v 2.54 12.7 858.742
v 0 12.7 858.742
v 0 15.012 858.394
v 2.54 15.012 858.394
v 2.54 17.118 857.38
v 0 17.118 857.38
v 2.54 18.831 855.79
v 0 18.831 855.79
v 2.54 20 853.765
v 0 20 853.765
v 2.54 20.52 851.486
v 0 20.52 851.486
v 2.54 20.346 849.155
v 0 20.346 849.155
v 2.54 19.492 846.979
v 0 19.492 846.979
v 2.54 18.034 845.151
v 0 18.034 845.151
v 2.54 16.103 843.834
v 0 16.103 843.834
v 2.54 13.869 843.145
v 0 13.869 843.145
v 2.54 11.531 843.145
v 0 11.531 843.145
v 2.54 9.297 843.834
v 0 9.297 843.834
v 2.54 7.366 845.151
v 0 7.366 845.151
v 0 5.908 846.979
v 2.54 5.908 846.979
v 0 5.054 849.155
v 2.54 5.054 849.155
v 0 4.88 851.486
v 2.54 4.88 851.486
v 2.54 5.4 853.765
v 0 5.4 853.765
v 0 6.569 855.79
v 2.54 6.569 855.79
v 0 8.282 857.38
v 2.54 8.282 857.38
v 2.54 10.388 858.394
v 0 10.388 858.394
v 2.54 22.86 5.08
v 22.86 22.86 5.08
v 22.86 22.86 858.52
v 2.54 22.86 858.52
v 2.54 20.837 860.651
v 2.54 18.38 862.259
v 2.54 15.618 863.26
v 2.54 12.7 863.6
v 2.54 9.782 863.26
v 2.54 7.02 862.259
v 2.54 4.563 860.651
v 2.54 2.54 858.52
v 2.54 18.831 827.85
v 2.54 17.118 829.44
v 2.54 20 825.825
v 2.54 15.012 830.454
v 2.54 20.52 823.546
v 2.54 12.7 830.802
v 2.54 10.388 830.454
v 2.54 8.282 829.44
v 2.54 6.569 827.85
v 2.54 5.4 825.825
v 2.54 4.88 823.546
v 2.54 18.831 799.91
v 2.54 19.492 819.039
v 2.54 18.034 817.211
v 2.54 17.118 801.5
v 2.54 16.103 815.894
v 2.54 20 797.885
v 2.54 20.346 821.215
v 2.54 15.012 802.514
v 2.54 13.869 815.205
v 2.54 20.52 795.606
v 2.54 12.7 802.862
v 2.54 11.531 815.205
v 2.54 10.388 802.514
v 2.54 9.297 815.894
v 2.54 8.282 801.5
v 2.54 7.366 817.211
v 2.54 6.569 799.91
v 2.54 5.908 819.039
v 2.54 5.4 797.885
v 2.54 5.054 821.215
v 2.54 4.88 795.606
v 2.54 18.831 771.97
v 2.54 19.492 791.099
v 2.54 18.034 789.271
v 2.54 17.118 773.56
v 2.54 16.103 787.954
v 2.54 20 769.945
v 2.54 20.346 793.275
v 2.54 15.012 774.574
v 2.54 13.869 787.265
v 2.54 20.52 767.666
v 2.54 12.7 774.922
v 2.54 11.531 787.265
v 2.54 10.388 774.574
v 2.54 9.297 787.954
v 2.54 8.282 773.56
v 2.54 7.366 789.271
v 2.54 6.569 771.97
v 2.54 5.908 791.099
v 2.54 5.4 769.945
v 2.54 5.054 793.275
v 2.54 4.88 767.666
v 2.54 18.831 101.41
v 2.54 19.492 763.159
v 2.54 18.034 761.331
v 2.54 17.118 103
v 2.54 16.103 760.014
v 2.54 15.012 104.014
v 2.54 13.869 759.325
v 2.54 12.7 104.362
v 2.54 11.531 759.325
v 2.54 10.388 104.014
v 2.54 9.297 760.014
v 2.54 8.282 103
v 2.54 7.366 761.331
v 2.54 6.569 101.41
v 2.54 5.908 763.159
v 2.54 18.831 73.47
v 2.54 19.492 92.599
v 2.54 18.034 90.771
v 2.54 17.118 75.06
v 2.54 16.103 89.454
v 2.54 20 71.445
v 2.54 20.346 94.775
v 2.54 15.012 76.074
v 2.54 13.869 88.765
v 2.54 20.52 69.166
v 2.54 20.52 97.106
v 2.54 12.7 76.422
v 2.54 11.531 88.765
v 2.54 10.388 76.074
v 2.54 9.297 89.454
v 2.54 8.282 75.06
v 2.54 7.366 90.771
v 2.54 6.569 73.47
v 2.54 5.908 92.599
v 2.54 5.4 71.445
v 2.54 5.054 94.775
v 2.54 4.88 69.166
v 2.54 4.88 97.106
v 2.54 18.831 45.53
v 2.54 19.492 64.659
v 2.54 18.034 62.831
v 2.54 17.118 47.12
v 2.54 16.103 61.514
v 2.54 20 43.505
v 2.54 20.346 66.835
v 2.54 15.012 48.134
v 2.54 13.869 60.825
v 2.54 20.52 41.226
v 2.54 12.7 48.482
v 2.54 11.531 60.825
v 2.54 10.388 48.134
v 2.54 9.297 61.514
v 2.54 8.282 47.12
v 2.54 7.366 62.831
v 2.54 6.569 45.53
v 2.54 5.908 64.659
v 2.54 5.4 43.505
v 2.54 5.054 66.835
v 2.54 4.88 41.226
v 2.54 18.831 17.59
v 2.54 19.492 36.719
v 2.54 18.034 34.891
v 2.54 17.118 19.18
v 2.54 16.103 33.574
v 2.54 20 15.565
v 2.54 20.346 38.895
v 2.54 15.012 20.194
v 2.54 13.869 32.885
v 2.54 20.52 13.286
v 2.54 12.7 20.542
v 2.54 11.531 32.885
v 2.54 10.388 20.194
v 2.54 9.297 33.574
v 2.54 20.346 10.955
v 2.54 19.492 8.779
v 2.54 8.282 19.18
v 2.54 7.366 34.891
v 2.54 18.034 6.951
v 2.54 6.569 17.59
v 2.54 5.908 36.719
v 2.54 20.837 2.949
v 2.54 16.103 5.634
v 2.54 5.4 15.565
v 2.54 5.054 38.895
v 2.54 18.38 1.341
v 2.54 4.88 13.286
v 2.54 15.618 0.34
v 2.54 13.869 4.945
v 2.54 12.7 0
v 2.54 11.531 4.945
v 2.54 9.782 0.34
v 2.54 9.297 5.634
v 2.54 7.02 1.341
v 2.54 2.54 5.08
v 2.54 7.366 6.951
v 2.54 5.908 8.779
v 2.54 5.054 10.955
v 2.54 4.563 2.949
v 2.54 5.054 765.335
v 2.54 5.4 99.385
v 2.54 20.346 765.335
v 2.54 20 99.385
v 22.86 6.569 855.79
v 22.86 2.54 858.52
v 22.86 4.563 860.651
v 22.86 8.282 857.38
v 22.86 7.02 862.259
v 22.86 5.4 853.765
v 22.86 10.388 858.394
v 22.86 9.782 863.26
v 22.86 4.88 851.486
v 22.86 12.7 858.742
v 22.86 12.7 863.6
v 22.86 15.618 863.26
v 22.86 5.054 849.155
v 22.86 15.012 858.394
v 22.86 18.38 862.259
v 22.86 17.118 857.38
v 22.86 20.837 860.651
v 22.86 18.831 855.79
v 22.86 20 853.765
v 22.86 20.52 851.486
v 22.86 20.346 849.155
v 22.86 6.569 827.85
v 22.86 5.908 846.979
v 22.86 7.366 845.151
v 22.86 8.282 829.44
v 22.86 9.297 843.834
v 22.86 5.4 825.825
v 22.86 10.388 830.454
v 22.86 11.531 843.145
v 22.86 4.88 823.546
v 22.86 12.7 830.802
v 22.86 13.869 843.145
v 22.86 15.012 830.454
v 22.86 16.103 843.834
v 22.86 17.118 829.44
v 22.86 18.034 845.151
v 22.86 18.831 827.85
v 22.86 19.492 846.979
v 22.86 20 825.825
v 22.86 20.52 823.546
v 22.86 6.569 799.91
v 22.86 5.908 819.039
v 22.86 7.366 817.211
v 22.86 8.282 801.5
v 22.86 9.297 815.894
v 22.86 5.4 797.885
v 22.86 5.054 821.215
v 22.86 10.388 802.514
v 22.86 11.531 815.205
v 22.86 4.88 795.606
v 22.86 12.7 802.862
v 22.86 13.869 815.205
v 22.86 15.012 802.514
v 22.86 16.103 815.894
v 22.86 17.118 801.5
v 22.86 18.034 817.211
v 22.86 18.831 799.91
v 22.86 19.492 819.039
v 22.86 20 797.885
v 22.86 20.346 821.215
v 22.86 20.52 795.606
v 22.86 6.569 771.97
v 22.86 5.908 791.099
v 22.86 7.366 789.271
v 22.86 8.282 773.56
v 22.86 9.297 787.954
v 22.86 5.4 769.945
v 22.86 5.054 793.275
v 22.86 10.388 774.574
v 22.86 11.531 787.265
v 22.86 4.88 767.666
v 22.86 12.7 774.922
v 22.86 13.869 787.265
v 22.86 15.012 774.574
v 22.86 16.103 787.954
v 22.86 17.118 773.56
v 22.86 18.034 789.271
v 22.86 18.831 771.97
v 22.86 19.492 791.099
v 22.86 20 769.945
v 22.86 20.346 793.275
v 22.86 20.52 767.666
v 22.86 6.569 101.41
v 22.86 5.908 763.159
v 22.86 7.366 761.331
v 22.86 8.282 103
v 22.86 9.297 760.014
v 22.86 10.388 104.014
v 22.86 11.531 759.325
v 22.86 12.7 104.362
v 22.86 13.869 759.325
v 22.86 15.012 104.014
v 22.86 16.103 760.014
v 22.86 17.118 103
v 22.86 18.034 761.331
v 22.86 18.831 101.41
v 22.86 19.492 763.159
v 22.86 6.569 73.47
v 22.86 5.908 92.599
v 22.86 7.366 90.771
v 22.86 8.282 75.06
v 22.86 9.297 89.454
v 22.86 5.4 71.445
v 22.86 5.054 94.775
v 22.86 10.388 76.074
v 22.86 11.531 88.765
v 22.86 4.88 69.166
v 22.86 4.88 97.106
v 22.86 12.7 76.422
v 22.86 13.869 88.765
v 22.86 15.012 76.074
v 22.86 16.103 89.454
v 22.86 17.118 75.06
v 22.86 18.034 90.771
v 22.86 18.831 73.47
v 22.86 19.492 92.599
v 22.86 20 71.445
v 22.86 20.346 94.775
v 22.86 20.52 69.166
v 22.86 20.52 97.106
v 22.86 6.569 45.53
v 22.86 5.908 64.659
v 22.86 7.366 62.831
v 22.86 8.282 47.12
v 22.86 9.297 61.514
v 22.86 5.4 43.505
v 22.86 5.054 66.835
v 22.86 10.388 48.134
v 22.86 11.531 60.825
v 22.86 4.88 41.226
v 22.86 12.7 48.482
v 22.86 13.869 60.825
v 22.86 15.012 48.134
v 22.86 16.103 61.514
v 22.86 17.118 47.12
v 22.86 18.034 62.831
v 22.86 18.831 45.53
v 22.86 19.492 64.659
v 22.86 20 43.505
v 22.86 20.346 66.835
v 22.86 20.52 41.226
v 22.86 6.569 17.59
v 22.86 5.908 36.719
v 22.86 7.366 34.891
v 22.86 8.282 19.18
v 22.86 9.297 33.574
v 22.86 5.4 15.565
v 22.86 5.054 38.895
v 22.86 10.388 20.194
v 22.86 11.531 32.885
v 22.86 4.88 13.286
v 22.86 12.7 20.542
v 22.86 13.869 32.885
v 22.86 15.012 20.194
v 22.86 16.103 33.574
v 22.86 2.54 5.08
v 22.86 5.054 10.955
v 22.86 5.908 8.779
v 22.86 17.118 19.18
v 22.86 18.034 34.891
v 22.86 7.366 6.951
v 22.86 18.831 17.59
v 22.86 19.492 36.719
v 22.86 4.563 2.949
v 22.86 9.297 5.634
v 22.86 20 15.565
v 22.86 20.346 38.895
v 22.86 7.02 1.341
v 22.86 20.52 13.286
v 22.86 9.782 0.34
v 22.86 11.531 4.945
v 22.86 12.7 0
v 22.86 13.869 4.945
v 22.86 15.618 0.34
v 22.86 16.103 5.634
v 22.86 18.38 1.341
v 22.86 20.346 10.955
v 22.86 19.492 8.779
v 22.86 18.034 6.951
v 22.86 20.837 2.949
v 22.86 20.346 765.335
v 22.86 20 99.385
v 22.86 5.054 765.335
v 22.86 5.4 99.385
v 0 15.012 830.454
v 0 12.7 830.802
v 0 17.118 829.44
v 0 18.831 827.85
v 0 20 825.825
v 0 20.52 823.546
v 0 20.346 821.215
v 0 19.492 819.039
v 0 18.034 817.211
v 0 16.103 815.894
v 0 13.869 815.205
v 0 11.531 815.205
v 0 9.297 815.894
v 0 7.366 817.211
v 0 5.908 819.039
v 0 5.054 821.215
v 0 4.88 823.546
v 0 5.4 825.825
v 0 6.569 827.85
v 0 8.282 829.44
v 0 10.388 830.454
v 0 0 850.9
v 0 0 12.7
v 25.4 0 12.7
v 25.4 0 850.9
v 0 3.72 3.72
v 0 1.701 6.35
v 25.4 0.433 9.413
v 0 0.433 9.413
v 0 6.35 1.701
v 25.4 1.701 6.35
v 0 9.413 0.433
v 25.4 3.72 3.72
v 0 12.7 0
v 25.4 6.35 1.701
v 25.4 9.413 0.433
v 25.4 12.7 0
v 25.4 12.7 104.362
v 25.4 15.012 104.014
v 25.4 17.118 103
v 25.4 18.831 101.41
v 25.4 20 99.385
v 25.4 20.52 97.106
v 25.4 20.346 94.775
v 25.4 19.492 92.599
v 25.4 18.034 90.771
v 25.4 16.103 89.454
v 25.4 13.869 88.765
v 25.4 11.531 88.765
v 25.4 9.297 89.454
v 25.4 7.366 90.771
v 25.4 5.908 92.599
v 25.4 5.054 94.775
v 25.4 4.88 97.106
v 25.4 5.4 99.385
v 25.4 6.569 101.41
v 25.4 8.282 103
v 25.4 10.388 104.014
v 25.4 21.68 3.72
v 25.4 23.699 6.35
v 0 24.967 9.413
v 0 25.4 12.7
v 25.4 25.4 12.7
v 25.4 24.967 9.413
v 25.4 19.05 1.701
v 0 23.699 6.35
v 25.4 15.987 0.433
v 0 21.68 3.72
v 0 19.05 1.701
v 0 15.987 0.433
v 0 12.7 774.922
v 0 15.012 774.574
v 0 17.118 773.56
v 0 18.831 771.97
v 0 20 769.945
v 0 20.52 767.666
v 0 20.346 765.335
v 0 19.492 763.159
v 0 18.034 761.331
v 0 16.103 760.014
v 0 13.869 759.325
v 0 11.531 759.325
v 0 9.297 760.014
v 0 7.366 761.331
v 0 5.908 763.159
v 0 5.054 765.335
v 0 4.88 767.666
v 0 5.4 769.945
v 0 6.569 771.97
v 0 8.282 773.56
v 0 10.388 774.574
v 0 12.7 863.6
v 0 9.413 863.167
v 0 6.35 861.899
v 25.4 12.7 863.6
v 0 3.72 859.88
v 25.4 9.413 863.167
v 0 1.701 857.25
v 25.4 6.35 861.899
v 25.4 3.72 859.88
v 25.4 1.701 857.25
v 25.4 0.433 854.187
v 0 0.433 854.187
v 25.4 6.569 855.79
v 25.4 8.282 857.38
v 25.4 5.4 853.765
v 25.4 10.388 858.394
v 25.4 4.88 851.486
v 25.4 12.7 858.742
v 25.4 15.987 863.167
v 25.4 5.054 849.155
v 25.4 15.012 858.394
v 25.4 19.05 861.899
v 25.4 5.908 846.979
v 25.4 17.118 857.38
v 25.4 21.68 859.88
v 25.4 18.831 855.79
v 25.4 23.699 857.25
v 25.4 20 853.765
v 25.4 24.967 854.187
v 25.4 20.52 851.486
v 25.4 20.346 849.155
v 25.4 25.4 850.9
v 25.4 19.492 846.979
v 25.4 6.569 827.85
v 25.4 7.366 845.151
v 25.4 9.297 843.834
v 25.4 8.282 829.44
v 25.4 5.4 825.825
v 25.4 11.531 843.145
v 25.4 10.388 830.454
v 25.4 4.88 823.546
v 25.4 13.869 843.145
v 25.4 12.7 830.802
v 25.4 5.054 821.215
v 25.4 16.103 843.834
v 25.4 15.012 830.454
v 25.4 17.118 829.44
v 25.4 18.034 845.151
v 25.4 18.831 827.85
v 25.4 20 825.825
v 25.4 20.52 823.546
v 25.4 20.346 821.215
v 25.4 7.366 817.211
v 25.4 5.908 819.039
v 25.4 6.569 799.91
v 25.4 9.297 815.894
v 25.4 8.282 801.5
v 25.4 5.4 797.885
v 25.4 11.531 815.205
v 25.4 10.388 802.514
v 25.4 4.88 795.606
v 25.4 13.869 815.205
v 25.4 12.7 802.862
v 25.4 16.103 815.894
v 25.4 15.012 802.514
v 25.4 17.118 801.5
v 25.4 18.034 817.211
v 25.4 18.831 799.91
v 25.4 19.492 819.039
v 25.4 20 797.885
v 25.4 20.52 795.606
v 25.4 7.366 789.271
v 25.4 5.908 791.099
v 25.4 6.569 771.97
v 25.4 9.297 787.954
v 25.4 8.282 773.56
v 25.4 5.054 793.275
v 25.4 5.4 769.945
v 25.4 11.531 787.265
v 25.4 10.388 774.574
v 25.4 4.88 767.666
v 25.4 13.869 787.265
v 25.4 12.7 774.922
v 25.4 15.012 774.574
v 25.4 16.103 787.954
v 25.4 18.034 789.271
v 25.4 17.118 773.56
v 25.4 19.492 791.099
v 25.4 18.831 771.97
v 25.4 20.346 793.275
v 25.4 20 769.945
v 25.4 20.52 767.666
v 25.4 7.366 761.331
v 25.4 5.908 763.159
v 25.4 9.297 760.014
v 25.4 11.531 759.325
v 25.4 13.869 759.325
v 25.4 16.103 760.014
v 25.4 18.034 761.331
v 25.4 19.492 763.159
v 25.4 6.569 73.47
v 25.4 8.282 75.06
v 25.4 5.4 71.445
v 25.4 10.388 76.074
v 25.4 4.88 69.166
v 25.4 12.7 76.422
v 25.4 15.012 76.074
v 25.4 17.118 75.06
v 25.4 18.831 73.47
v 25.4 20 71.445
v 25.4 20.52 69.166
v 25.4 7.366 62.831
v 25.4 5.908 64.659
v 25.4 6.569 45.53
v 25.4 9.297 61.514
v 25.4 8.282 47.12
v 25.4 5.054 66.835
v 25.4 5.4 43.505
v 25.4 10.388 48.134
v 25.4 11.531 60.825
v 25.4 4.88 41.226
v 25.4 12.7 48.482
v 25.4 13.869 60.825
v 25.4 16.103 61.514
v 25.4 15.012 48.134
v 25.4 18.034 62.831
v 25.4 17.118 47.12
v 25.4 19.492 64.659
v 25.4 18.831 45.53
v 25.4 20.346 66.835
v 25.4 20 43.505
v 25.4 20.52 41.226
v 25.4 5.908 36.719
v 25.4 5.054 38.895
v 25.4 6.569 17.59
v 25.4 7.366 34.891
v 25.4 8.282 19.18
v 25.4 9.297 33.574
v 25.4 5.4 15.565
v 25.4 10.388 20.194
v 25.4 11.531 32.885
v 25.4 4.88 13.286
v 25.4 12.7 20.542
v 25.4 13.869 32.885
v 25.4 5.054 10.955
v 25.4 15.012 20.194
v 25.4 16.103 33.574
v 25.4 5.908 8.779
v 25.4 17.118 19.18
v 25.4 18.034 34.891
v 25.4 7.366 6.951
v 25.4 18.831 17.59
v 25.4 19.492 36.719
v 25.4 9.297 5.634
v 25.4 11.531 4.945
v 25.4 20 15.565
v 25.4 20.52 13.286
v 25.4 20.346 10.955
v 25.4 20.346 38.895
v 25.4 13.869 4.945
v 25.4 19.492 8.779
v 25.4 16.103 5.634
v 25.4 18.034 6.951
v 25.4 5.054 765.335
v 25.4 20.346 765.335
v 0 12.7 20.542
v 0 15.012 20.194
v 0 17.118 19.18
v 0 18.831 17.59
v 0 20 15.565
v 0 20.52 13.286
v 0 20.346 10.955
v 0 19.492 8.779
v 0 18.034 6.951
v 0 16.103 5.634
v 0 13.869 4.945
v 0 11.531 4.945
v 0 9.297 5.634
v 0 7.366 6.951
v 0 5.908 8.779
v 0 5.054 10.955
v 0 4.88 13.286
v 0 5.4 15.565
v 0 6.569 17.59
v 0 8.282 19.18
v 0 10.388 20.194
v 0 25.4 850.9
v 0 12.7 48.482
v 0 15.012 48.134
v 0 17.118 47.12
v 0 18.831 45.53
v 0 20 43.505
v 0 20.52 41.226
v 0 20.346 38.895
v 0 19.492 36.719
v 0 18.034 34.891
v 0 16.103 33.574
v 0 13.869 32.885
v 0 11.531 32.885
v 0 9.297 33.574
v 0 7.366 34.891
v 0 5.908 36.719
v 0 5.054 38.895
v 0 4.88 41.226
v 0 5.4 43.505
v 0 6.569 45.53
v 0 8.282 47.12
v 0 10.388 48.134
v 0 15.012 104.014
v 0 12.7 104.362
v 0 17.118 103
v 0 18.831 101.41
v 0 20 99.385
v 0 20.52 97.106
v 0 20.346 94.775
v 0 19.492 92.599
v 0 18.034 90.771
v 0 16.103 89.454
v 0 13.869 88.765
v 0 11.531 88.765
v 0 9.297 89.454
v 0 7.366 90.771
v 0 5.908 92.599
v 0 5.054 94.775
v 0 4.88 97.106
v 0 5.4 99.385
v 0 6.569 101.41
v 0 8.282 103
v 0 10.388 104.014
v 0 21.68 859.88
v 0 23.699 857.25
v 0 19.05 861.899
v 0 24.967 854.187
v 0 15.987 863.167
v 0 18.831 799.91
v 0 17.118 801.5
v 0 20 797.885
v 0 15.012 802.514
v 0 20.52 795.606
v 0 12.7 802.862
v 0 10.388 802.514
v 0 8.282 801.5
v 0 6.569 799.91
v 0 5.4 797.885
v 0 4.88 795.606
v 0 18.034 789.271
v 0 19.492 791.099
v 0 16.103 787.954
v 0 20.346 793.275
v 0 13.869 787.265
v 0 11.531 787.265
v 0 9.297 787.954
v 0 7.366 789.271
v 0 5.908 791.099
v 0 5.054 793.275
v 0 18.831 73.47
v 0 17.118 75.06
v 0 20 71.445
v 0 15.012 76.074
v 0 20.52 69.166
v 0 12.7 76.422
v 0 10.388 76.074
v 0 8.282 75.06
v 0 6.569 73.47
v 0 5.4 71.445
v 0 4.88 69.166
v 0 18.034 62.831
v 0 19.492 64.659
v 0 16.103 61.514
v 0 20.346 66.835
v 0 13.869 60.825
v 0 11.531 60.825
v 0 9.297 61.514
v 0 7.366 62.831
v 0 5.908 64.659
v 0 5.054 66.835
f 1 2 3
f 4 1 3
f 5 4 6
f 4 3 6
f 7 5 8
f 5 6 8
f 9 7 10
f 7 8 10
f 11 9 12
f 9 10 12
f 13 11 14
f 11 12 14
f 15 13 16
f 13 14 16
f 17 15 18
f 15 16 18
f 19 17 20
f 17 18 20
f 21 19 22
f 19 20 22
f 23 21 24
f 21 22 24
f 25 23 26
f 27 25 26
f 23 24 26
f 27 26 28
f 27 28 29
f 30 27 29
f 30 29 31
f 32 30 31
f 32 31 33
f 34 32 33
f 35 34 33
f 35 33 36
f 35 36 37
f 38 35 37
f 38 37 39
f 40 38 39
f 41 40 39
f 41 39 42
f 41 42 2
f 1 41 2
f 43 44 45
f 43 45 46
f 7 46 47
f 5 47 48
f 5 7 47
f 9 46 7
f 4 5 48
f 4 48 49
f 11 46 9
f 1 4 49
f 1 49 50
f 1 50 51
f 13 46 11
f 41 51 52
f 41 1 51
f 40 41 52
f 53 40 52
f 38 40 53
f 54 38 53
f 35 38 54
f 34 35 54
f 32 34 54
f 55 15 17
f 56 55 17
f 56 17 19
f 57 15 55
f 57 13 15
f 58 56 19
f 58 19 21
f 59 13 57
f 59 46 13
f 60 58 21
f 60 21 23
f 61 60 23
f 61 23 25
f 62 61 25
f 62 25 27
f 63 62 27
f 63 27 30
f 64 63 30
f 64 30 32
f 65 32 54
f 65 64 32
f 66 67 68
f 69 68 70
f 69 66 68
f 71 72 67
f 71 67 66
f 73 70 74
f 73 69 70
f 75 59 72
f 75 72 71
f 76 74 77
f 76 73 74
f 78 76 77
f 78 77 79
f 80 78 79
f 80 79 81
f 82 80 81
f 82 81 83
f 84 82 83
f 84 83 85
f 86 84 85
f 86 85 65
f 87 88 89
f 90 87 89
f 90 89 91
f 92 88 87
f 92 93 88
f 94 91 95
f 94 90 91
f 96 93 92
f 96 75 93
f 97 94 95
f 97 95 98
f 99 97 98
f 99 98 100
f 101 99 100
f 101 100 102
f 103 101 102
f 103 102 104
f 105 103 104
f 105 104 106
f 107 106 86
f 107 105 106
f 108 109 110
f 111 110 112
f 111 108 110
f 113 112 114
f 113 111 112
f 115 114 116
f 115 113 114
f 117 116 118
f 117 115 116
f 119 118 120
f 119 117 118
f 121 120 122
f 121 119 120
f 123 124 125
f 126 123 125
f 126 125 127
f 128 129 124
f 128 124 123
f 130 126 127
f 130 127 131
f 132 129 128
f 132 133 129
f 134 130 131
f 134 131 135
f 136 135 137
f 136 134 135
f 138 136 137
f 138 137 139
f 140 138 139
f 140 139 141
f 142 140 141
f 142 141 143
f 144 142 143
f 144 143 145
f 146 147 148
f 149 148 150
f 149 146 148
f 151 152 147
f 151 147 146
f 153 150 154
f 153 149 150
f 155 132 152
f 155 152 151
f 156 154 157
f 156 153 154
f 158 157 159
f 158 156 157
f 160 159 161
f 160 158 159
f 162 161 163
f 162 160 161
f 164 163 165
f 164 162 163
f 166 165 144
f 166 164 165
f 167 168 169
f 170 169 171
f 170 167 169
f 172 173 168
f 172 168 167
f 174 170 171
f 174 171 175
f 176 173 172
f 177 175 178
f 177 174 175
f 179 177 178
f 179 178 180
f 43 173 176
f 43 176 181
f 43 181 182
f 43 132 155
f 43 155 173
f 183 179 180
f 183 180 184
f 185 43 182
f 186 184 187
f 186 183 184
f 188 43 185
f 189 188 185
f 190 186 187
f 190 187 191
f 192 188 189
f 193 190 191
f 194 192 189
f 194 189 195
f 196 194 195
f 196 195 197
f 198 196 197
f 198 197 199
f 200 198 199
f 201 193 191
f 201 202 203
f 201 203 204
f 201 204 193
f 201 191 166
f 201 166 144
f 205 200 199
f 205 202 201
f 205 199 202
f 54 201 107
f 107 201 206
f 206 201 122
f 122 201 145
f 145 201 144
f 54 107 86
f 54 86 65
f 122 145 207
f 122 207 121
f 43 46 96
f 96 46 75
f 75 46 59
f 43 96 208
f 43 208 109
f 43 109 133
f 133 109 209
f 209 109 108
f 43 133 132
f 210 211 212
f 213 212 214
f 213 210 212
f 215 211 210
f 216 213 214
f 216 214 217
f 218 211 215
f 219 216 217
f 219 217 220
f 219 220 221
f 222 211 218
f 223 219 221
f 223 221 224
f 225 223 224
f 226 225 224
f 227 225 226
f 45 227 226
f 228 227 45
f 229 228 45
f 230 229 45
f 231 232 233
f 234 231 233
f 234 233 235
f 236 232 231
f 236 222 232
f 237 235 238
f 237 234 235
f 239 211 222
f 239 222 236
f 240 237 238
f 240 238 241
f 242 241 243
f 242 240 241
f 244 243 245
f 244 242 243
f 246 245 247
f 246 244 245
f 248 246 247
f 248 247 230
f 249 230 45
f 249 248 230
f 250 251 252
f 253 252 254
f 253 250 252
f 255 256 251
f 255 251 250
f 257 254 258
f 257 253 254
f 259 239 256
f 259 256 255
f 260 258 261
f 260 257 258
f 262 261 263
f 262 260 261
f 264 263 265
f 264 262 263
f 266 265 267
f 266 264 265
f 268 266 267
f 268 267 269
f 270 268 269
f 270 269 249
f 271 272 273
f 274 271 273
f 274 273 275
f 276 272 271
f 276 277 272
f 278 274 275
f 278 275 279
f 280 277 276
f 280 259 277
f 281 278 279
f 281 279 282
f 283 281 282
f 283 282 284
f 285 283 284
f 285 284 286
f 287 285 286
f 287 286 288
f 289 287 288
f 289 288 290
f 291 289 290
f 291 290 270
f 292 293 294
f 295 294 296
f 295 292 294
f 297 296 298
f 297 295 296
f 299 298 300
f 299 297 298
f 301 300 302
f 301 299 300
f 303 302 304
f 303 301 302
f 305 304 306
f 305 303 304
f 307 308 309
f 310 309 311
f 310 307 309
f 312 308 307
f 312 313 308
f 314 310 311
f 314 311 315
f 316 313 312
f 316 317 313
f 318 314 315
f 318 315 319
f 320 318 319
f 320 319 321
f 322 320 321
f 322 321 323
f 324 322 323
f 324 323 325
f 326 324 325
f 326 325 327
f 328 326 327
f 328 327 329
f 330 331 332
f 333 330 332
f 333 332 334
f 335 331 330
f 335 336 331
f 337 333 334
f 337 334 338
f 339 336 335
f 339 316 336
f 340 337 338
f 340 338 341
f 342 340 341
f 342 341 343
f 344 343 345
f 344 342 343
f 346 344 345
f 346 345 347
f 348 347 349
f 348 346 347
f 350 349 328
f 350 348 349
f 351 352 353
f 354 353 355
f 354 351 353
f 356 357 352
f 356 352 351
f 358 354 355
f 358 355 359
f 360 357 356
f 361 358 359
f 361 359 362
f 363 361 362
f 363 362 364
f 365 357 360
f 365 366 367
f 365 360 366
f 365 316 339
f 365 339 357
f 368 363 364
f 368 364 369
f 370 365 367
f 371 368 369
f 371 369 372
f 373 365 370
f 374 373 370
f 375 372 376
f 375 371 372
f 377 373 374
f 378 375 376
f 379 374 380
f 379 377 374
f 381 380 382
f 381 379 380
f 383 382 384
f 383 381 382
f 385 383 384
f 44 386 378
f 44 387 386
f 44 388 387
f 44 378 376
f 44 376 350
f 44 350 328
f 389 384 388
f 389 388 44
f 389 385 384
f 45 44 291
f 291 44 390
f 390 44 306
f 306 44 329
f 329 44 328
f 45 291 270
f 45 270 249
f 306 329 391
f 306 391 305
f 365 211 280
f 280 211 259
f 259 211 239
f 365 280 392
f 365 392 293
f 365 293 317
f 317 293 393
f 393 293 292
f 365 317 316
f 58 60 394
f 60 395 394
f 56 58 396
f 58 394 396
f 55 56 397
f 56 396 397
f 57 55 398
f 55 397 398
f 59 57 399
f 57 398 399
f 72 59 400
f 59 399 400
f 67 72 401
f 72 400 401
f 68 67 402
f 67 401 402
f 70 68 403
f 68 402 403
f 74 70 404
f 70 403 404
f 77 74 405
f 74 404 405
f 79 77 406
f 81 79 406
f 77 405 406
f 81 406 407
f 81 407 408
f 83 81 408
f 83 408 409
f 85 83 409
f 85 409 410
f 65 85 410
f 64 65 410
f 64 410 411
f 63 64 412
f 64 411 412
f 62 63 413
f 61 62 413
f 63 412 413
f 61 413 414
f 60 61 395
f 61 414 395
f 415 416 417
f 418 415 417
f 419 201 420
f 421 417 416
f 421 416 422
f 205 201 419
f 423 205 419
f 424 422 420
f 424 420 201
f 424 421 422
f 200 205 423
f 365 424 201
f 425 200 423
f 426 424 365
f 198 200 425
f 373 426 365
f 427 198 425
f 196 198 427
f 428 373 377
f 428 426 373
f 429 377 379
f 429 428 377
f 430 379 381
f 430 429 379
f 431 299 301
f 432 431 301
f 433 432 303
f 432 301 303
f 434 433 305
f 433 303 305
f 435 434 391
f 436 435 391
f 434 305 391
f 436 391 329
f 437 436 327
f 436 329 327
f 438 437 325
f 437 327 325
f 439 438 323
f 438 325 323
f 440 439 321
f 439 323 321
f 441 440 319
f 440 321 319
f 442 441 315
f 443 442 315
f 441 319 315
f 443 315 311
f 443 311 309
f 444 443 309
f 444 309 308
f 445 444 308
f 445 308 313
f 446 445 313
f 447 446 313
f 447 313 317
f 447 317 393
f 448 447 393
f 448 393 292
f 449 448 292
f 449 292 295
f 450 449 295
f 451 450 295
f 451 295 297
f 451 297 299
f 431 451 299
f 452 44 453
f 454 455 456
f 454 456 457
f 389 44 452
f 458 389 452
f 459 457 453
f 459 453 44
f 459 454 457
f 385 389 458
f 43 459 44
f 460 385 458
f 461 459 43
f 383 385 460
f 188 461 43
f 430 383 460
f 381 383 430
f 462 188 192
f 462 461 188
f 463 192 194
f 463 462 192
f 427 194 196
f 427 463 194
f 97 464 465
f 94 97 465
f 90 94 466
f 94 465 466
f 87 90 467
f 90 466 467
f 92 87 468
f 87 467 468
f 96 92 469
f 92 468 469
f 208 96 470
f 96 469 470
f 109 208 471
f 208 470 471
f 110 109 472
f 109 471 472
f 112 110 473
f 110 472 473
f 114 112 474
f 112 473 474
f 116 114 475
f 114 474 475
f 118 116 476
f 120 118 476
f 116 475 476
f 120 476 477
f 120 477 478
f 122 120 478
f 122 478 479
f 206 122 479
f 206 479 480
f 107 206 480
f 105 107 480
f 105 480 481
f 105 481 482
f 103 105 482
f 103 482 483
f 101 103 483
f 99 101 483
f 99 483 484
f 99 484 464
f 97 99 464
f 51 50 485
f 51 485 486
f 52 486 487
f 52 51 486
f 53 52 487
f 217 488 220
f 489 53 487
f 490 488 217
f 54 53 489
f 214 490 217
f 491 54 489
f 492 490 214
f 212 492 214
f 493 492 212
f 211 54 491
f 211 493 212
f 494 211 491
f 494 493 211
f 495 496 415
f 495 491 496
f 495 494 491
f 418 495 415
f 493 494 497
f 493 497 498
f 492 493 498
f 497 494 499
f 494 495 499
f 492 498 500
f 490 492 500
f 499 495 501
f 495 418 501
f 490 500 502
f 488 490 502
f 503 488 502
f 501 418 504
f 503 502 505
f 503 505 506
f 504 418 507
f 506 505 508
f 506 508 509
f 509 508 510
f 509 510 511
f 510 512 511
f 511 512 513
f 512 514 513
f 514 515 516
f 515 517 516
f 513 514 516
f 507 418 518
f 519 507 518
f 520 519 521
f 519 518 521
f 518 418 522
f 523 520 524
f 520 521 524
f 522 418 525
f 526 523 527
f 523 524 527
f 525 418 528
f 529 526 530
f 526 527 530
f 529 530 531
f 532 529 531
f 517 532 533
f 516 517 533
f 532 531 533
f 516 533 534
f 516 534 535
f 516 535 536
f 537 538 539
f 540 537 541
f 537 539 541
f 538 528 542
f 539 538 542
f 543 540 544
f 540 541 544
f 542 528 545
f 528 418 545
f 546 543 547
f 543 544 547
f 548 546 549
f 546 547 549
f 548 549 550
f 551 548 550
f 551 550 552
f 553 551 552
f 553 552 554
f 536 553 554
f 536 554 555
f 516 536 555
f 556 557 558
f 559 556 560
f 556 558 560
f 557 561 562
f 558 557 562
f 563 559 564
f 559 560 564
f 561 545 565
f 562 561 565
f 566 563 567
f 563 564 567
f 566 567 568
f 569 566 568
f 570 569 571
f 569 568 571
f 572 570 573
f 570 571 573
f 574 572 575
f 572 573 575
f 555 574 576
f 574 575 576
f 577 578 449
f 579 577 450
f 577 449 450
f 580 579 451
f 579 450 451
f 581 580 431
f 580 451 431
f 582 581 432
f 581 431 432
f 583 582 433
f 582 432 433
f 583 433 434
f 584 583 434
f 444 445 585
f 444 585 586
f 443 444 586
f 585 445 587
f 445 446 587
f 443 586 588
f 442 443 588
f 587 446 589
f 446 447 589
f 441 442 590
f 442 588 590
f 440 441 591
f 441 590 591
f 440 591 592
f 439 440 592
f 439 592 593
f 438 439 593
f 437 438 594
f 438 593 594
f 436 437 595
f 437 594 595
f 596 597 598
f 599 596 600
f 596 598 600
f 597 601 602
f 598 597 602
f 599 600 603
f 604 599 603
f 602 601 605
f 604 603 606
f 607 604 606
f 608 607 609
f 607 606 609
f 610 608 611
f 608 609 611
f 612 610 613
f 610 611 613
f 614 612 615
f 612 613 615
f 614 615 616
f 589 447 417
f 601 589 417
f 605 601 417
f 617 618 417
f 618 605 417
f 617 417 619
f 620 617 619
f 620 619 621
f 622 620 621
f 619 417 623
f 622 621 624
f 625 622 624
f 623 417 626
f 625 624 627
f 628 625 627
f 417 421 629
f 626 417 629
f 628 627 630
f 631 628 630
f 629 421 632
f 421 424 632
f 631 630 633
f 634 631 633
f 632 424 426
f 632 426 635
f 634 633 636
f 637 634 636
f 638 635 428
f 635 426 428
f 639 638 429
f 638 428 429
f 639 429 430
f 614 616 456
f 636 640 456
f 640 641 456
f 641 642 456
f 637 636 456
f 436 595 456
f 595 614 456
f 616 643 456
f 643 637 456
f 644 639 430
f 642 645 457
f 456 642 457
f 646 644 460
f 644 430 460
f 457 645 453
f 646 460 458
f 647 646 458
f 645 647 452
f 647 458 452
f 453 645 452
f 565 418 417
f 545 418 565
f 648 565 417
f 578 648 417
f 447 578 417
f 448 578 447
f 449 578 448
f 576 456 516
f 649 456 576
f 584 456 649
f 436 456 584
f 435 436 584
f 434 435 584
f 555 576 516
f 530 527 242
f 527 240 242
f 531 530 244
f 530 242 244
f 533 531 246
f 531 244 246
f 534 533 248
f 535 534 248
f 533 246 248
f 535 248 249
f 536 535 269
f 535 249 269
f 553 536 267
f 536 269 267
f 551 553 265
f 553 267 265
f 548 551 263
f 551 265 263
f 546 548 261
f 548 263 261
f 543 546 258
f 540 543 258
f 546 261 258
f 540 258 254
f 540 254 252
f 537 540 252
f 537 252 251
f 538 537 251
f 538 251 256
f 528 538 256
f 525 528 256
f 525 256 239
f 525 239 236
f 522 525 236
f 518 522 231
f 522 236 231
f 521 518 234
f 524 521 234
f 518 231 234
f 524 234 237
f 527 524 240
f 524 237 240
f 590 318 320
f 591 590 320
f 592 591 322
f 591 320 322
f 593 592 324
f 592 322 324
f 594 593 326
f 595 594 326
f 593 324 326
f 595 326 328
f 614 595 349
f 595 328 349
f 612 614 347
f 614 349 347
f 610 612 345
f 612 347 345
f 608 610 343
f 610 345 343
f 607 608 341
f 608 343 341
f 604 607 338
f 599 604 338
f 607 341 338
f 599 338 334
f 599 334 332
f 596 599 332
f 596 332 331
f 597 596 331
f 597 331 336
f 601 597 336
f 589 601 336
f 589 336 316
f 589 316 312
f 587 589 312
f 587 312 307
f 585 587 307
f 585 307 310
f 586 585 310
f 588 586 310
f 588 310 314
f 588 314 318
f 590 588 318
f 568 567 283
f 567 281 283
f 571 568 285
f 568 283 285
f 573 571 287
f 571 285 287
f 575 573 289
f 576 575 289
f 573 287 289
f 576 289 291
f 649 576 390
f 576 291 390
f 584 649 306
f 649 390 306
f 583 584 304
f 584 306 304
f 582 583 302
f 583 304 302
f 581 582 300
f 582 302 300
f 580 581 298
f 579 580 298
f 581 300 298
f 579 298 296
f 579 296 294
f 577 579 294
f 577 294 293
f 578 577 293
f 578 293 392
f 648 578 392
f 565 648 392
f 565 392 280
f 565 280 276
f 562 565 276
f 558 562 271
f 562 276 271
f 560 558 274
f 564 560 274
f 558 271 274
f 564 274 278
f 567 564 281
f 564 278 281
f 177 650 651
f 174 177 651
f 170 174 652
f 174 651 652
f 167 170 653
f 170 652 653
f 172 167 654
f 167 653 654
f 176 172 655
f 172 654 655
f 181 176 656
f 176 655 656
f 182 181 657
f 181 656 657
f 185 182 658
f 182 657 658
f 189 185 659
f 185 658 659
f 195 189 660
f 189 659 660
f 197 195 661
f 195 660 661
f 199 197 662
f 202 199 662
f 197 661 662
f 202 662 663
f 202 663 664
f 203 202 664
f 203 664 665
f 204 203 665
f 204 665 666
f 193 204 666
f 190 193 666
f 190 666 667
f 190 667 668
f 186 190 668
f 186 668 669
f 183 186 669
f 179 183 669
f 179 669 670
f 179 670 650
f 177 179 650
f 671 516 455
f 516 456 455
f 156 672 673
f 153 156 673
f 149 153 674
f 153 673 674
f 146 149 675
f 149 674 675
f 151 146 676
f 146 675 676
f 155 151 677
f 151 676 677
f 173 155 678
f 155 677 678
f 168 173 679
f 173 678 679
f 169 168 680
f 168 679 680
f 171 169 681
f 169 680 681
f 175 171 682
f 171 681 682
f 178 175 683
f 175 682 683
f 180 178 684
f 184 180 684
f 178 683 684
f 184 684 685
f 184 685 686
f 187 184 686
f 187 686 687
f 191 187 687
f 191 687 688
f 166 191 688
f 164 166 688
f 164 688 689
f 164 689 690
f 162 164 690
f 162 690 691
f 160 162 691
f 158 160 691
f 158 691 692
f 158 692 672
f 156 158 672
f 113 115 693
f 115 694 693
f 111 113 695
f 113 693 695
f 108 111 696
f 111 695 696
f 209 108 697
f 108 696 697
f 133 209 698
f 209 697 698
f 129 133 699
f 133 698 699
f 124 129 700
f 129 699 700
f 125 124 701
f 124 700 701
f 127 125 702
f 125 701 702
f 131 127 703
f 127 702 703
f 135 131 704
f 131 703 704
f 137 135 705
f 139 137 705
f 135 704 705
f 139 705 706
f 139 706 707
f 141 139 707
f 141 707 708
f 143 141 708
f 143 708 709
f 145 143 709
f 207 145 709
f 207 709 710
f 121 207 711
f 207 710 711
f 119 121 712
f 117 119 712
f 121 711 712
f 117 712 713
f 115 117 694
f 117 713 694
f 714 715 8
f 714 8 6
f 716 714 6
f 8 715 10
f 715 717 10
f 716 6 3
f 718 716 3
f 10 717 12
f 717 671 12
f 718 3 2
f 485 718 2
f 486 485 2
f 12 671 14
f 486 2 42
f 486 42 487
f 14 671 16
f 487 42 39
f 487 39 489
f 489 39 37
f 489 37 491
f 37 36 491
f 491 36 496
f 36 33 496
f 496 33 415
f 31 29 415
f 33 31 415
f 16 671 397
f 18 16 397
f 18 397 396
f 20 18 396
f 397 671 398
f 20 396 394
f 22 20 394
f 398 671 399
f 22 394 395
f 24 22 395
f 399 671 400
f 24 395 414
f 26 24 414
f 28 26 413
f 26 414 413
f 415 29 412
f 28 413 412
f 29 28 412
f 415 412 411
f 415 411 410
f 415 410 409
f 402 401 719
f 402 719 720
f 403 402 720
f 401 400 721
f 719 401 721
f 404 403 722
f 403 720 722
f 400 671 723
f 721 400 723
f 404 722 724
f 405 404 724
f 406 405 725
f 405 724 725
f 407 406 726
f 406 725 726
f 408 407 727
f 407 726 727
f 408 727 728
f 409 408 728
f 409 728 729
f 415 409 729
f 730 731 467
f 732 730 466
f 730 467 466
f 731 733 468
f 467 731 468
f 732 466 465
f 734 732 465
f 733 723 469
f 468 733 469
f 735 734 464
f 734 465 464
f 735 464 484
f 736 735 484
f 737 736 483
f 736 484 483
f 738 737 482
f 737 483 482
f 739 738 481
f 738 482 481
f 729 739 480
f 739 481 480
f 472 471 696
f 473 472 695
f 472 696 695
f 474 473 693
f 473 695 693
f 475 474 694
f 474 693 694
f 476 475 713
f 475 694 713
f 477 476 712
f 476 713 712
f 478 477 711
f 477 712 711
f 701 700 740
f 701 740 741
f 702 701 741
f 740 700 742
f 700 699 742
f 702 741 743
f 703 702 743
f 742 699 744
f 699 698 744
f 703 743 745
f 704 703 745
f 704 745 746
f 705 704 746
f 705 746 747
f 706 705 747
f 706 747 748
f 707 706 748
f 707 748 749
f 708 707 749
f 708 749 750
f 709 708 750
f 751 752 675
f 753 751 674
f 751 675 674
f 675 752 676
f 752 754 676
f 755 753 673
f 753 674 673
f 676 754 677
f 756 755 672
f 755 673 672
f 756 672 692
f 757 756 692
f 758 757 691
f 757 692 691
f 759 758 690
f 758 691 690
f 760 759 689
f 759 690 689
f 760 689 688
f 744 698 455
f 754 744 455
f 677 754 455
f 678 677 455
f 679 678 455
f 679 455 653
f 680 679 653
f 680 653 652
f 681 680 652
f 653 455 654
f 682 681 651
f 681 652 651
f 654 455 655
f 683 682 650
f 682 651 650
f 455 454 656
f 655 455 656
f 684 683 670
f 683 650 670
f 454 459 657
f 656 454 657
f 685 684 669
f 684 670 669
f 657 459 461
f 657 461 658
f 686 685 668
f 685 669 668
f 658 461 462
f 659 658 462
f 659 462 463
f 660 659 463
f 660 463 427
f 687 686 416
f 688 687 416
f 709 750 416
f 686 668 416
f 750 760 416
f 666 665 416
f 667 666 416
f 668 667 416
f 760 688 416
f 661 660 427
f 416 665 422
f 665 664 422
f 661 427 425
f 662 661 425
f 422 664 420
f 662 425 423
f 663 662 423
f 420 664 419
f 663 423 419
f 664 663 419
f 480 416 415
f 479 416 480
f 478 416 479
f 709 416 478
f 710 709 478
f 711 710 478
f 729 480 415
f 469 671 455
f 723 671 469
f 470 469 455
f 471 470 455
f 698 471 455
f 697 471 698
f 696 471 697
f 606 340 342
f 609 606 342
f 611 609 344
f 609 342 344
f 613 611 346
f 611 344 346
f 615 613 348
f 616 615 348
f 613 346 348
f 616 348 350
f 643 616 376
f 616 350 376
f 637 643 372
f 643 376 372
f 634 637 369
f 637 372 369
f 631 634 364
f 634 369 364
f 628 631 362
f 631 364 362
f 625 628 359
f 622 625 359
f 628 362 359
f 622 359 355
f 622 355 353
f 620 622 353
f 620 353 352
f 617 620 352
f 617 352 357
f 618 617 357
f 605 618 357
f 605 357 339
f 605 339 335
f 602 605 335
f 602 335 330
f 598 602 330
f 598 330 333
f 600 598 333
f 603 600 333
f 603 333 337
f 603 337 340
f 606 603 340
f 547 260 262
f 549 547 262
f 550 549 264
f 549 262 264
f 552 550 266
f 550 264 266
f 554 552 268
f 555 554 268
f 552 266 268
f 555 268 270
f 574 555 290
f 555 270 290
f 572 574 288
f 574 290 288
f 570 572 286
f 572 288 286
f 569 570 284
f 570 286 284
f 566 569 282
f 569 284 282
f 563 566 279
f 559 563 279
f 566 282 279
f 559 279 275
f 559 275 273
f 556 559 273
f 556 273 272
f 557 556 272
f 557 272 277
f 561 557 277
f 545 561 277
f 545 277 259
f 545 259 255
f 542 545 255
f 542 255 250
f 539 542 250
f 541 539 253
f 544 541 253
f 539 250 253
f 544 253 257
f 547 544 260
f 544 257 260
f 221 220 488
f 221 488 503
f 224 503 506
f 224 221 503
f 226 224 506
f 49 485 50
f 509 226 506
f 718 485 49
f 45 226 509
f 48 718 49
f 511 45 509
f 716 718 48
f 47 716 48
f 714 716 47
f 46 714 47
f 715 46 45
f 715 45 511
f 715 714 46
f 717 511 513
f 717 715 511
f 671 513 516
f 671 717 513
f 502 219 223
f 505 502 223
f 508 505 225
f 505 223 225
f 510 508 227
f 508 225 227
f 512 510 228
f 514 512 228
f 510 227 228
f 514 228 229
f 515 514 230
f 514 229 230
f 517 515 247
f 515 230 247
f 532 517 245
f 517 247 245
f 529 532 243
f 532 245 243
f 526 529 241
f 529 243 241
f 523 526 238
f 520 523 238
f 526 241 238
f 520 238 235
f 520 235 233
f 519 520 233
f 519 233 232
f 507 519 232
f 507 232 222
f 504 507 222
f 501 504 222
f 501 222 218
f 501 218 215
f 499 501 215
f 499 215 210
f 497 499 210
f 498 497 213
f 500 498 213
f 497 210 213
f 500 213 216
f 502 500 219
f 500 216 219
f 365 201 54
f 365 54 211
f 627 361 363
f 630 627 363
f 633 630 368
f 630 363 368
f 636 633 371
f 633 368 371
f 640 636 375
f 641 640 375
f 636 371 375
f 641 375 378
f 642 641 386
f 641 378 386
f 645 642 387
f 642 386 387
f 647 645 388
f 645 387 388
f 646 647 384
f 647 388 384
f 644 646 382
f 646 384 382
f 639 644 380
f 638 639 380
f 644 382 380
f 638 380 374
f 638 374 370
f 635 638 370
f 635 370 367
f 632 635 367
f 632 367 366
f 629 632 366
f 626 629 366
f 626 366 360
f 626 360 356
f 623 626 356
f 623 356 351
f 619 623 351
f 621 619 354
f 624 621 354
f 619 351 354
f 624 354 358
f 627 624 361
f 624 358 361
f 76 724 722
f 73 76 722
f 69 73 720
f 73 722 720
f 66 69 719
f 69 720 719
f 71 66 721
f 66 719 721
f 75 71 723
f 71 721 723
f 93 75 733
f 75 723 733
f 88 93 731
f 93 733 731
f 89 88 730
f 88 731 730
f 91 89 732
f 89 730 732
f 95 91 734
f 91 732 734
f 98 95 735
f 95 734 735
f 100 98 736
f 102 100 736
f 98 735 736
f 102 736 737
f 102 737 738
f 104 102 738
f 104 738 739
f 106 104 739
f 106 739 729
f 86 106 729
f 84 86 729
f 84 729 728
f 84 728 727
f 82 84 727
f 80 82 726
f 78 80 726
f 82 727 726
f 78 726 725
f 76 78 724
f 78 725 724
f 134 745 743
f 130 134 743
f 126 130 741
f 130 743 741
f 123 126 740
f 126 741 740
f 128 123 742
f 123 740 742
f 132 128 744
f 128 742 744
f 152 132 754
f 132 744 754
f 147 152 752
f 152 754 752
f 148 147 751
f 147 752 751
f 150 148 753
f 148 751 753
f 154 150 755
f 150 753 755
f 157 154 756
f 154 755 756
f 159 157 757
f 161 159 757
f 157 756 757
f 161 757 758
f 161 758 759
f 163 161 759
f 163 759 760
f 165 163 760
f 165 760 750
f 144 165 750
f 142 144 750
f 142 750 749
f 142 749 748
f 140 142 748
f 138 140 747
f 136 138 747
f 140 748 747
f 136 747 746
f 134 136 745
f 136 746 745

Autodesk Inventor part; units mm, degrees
ref_plane "YZ Plane" through (0, 0, 0) normal (1, 0, 0) x (0, 1, 0)
ref_plane "XZ Plane" through (0, 0, 0) normal (0, 1, 0) x (-1, 0, 0)
ref_plane "XY Plane" through (0, 0, 0) normal (0, 0, 1) x (1, 0, 0)
sketch "Sketch1" plane through (0, 0, 0) normal (0, 0, 1) x (1, 0, 0)
  line L0 (0, 0) -> (25.4, 0)
  line L1 (25.4, 0) -> (25.4, 25.4)
  line L2 (25.4, 25.4) -> (0, 25.4)
  line L3 (0, 25.4) -> (0, 0)
  dimension "d0" = 25.4
  dimension "d1" = 25.4
extrude "Extrusion1" add sketch "Sketch1" along normal blind 863.6
fillet "Fillet1" radius 12.7 4 edges at (12.7, 25.4, 863.6) (12.7, 0, 863.6) (12.7, 25.4, 0) (12.7, 0, 0)
sketch "Sketch2" plane through (0, 0, 0) normal (0, 0, 1) x (1, 0, 0)
  line L0 (22.86, 22.86) -> (2.54, 22.86)
  line L1 (2.54, 22.86) -> (2.54, 2.54)
  line L2 (2.54, 2.54) -> (22.86, 2.54)
  line L3 (22.86, 2.54) -> (22.86, 22.86)
  line L4 (0, 25.4) -> (25.4, 25.4) projected
  line L5 (0, 0) -> (0, 25.4) projected
  line L6 (25.4, 0) -> (0, 0) projected
  line L7 (25.4, 25.4) -> (25.4, 0) projected
  dimension "d5" = 2.54
  dimension "d6" = 2.54
  dimension "d7" = 2.54
  dimension "d8" = 2.54
extrude "Extrusion2" cut sketch "Sketch2" along normal blind 1016 contours L3 L2 L1 L0
sketch "Sketch3" plane through (0, 12.7, 12.7) normal (-1, 0, 0) x (0, 0, 1)
  circle A0 centre (0, 0) radius 7.8422
  circle A1 centre (27.94, 0) radius 7.8422
  circle A2 centre (55.88, 0) radius 7.8422
  circle A3 centre (83.82, 0) radius 7.8423
  circle A4 centre (838.2, 0) radius 7.8423
  circle A5 centre (810.26, 0) radius 7.8422
  circle A6 centre (782.32, 0) radius 7.8422
  circle A7 centre (754.38, 0) radius 7.8423
  line L0 (0, 12.7) -> (838.2, 12.7)
  arc A8 (0, 12.7) -> (0, -12.7) centre (0, 0) ccw
  arc A9 (838.2, -12.7) -> (838.2, 12.7) centre (838.2, 0) ccw
  point P0 (-12.7, -12.7)
  dimension "d11" = 15.6845
  dimension "d12" = 15.6845
  dimension "d13" = 15.6845
  dimension "d14" = 15.6845
  dimension "d15" = 15.6845
  dimension "d16" = 15.6845
  dimension "d17" = 15.6845
  dimension "d18" = 15.6845
  dimension "d19" = 12.7
  dimension "d20" = 12.7
  dimension "d21" = 12.7
  dimension "d22" = 12.7
  dimension "d23" = 12.7
  dimension "d24" = 12.7
  dimension "d25" = 12.7
  dimension "d26" = 12.7
  dimension "d27" = 0
  dimension "d28" = 27.94
  dimension "d29" = 27.94
  dimension "d30" = 27.94
  dimension "d31" = 0
  dimension "d32" = 27.94
  dimension "d33" = 27.94
  dimension "d34" = 27.94
extrude "Extrusion3" cut sketch "Sketch3" against normal blind 25.4
equation "\"d29\" = d28"
equation "\"d30\" = d28"
equation "\"d33\" = d32"
equation "\"d34\" = d32"
properties part number "Support Pivs 25 uppermiddle"
